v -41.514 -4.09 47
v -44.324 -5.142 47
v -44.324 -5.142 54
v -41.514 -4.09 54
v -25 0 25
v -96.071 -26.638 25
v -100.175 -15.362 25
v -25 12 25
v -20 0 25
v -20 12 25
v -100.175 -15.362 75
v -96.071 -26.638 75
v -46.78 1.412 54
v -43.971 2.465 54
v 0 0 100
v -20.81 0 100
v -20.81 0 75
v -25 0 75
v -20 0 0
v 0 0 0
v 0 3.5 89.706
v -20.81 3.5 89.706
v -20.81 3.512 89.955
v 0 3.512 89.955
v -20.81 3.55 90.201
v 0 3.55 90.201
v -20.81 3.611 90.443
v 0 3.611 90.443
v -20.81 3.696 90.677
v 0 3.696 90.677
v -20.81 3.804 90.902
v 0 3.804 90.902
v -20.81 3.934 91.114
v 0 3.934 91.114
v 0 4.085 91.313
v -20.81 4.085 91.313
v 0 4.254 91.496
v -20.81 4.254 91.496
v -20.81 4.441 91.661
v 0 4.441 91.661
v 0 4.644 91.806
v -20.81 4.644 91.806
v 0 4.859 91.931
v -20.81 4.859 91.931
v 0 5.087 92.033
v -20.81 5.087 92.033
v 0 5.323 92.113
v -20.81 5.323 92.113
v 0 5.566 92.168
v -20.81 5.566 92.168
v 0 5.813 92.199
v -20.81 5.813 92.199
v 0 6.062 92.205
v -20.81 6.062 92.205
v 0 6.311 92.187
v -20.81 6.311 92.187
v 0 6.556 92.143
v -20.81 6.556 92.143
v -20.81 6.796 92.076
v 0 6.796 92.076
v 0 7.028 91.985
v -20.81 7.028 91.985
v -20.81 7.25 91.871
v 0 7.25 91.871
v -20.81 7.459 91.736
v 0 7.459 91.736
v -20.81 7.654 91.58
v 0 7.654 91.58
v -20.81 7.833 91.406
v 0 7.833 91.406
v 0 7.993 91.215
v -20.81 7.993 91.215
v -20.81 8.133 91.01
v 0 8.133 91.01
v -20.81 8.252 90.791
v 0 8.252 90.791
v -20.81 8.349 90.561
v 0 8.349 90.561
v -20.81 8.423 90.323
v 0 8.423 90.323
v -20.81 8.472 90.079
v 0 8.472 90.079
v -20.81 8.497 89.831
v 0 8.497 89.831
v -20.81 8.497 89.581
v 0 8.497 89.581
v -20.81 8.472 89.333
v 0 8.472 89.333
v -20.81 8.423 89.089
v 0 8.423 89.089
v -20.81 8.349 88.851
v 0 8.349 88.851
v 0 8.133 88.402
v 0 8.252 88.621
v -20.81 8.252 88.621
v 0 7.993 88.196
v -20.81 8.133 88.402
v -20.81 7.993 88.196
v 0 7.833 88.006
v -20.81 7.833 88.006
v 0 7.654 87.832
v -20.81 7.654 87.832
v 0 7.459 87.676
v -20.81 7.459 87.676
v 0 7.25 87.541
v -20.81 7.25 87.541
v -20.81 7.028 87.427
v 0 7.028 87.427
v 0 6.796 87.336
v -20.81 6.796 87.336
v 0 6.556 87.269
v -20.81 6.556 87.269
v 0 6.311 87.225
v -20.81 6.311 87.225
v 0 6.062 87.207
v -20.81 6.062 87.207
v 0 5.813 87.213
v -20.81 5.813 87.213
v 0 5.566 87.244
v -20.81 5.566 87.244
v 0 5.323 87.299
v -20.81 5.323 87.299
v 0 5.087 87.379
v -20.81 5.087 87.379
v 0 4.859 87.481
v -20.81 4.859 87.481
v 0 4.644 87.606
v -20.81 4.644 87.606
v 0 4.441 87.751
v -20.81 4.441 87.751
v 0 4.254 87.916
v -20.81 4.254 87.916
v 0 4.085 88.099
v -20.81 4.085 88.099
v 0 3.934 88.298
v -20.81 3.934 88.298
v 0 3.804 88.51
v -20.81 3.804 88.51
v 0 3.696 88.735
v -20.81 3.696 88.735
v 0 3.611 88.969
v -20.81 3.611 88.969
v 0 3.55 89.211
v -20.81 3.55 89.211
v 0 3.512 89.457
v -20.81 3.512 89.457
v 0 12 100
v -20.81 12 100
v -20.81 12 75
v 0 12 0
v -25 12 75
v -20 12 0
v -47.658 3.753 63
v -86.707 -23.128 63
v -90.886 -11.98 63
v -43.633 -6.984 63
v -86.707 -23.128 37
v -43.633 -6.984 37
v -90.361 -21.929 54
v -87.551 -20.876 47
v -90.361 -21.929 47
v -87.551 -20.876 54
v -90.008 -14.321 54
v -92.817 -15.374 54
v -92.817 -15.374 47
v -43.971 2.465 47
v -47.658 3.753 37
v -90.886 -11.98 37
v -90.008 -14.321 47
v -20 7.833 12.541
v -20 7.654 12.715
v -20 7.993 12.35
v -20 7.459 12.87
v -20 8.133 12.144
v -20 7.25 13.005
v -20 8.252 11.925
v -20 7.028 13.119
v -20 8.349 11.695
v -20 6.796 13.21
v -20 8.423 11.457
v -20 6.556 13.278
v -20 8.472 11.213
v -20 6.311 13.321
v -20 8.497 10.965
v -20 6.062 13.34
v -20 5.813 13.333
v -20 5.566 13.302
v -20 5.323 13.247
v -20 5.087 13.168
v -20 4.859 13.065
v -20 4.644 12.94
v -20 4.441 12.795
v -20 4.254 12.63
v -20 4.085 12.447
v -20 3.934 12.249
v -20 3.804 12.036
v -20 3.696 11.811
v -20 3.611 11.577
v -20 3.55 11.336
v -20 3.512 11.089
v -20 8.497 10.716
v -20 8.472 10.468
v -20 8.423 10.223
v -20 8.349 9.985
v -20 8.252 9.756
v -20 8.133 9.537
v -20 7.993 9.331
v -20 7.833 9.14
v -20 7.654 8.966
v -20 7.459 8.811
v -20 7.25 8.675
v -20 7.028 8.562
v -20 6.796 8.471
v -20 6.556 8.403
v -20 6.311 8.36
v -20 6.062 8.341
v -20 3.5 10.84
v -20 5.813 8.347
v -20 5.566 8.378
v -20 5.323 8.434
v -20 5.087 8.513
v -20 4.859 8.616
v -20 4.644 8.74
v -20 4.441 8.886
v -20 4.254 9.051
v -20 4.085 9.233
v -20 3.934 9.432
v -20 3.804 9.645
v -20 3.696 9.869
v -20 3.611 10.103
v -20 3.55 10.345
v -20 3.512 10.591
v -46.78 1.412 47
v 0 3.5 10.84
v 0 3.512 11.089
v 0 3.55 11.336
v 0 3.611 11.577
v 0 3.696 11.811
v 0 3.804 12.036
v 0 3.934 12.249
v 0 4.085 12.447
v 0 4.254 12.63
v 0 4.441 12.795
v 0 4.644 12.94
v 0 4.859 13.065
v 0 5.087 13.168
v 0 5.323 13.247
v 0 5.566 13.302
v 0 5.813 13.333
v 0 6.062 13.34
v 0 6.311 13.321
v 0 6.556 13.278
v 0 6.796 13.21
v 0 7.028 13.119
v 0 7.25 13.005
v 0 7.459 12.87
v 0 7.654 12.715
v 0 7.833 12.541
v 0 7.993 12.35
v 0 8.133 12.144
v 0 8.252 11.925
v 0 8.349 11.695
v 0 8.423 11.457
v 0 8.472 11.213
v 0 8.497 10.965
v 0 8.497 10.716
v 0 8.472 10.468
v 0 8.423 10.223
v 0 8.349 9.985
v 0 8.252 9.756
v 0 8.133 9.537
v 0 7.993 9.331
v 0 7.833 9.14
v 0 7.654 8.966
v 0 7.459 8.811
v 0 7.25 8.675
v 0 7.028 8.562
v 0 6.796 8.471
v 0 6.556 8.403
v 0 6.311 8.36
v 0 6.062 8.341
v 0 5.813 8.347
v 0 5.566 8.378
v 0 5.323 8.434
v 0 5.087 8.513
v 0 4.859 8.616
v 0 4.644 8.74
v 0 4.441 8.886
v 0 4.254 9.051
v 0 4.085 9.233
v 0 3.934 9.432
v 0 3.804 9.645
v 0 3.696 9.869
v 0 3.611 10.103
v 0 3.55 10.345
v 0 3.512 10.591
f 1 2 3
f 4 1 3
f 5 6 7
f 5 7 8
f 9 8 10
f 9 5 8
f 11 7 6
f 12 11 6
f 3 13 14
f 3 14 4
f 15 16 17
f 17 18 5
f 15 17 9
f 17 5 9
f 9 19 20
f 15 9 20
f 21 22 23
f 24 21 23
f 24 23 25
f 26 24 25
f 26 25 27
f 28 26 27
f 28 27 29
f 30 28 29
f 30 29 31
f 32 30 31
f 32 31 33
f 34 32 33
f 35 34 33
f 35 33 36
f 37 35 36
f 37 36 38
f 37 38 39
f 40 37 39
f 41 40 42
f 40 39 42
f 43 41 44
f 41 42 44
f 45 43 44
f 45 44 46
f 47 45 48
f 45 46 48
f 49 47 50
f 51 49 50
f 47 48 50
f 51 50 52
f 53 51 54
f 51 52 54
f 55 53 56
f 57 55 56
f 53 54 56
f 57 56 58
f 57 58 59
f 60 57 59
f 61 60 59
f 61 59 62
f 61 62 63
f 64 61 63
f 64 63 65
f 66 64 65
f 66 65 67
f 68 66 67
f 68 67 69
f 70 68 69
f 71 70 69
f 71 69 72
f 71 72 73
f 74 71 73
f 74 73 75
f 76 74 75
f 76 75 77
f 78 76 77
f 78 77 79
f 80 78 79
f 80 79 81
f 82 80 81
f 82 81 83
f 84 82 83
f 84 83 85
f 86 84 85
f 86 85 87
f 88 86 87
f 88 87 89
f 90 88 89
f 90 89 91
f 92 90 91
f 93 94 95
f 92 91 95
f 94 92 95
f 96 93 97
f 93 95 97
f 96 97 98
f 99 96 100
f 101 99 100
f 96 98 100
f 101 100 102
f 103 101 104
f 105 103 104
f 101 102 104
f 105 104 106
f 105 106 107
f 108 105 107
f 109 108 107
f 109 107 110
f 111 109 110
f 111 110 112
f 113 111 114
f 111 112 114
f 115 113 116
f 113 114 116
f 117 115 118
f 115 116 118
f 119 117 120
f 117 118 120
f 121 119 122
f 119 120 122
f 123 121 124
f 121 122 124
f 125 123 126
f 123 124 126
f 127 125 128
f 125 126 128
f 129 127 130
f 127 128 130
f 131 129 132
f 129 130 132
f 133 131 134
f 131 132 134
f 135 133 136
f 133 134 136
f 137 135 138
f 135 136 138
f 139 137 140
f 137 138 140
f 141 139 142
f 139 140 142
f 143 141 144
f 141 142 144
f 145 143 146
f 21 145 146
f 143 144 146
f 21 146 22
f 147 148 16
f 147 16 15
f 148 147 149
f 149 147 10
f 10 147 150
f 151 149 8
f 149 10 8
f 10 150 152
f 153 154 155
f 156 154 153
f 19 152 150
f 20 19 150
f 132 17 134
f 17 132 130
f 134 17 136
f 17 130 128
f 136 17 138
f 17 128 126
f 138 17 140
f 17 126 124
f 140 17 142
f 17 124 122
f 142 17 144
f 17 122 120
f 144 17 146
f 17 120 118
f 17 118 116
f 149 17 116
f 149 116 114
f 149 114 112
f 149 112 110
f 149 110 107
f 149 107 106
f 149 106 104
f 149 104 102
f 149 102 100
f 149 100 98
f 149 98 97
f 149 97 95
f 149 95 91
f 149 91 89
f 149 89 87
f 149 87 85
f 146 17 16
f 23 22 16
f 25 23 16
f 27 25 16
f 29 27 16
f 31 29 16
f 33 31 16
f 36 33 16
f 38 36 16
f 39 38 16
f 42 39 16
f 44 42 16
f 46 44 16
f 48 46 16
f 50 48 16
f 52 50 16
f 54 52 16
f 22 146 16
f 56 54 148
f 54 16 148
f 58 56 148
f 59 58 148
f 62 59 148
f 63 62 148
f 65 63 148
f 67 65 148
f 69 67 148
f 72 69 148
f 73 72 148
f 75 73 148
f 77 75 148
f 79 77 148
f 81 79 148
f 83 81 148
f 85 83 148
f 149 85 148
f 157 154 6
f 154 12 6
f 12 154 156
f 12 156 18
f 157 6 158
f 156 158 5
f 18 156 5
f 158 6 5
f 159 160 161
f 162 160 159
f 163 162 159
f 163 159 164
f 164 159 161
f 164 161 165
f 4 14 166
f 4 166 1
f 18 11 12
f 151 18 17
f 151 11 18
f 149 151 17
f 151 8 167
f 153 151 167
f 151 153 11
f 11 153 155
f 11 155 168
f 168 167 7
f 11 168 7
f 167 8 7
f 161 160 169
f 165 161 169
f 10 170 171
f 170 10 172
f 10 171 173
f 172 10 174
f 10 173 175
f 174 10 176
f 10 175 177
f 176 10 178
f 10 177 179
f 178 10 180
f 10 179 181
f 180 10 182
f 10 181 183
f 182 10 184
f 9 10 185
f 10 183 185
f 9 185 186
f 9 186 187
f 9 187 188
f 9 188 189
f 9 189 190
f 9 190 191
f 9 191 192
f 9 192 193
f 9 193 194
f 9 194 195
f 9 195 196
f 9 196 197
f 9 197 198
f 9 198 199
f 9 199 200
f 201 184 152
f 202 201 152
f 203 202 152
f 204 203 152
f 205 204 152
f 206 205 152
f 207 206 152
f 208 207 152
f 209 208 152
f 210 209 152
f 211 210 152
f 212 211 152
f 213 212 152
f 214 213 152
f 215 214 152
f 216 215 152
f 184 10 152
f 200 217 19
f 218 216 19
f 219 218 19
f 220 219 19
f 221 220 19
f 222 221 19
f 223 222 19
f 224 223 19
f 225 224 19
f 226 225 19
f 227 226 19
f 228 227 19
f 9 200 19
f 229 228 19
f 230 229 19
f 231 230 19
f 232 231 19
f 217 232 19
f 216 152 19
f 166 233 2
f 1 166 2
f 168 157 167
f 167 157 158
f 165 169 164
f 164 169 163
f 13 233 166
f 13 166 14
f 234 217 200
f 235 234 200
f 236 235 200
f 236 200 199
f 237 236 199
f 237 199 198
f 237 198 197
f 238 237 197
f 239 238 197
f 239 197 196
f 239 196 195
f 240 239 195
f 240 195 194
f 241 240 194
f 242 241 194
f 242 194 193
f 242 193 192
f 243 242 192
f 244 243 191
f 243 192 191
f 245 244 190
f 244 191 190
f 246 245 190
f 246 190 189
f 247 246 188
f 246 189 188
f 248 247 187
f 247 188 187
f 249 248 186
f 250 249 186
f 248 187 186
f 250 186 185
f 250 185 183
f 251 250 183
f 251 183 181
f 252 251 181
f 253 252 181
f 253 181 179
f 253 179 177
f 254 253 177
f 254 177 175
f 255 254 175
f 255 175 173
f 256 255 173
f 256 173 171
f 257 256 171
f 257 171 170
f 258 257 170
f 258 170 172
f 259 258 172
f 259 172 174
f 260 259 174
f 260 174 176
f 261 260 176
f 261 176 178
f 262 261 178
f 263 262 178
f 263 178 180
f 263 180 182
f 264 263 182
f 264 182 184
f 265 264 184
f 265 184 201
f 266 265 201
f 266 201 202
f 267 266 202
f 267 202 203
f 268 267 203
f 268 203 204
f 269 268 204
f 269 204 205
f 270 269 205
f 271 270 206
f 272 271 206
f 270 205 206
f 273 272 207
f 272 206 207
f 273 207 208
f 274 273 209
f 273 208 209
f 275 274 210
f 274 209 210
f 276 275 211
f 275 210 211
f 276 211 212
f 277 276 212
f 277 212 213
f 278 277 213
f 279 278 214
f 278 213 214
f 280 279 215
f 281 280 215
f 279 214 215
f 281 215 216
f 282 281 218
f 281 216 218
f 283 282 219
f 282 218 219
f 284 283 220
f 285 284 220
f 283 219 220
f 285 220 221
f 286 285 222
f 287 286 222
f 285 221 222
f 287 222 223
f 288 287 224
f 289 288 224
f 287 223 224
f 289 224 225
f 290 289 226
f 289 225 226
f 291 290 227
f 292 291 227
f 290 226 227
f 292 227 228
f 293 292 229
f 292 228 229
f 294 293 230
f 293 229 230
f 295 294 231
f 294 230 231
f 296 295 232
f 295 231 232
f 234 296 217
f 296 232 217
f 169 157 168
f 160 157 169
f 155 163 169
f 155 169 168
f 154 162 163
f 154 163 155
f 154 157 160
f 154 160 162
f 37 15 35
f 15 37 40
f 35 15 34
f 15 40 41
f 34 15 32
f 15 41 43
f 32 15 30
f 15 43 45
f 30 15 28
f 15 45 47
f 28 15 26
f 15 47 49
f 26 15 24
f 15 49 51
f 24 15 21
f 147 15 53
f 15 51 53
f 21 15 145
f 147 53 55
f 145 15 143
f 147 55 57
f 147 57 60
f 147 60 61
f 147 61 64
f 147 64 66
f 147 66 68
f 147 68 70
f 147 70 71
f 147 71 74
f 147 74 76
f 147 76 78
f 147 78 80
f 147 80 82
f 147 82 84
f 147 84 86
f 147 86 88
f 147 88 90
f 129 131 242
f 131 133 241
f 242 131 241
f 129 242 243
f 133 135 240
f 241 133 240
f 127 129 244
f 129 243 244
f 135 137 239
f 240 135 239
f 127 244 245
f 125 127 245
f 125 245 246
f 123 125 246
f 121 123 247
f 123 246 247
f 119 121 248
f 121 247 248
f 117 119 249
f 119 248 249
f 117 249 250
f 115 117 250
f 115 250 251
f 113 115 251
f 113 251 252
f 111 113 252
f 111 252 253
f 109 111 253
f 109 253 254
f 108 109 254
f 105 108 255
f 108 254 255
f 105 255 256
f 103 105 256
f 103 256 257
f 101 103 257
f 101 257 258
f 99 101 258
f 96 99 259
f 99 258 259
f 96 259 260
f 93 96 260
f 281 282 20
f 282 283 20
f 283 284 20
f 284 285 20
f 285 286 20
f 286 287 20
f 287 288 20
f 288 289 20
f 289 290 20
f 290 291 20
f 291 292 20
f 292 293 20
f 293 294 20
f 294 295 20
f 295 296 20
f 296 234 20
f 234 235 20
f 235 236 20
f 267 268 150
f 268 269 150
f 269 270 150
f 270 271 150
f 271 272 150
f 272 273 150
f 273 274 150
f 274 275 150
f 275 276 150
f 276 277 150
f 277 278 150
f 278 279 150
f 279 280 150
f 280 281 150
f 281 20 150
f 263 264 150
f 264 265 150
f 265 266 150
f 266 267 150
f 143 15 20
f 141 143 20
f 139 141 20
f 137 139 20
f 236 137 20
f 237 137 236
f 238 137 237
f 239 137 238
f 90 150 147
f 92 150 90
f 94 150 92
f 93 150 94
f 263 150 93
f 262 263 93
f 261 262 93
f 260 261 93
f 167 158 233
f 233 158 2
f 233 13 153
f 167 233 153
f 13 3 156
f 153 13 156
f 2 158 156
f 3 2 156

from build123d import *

# Parameters (mm, degrees)
F1_DEPTH  = 100
F3_W      = 46
F3_H      = 26
F4_DEPTH  = 25
F7_W      = 98.6057445407
F7_H      = 75.1156285405
F8_DEPTH  = 30
F10_W     = 97.911
F10_H     = 83.95
F11_DEPTH = 30
F15_R     = 2.5
F16_DEPTH = 30
F13_R     = 2.5
F17_DEPTH = 30
F19_W     = 7
F19_H     = 7
F20_DEPTH = 8
F22_W     = 7
F22_H     = 7
F23_DEPTH = 8


with BuildPart() as f1:
    # F0 (on Top) → F1 (new body)
    with BuildSketch(Plane.XY):
        Polygon((-25, 0), (0, 0), (0, 12), (-25, 12), (-100.1754096629, -15.3616114661), (-96.071167943, -26.6379229155), align=None)
    extrude(amount=F1_DEPTH)

    # F3 (on offset) → F4 (cut)
    with BuildSketch(Plane(origin=(-3.0794008865, 8.2159790861, 0), x_dir=(0.9363887892, 0.3509644362, 0), z_dir=(0.3509644362, -0.9363887892, 0))):
        with Locations((-66.3089282241, 50)):
            Rectangle(F3_W, F3_H)
    extrude(amount=-F4_DEPTH, mode=Mode.SUBTRACT)

    # F7 (on offset) → F8 (cut)
    with BuildSketch(Plane.XY.offset(105)):
        with Locations((-70.1127834618, -4.4539272785)):
            Rectangle(F7_W, F7_H)
    extrude(amount=-F8_DEPTH, mode=Mode.SUBTRACT)

    # F10 (on offset) → F11 (cut)
    with BuildSketch(Plane(origin=(0, 0, -5), x_dir=(1, 0, 0), z_dir=(0, 0, -1))):
        with Locations((-68.9555, -1.8251938164)):
            Rectangle(F10_W, F10_H)
    extrude(amount=-F11_DEPTH, mode=Mode.SUBTRACT)

    # F15 (on offset) → F16 (cut)
    with BuildSketch(Plane(origin=(-25, 0, 0), x_dir=(0, -1, 0), z_dir=(-1, 0, 0))):
        with Locations((-6, 10.8403703198)):
            Circle(F15_R)
    extrude(amount=-F16_DEPTH, mode=Mode.SUBTRACT)

    # F13 (on offset) → F17 (cut)
    with BuildSketch(Plane(origin=(-25.8099111915, 0, 0), x_dir=(0, -1, 0), z_dir=(-1, 0, 0))):
        with Locations((-6, 89.705966413)):
            Circle(F13_R)
    extrude(amount=-F17_DEPTH, mode=Mode.SUBTRACT)

    # F19 (on offset) → F20 (cut)
    with BuildSketch(Plane(origin=(-45.2359388073, -16.9547157565, 0), x_dir=(0.3509644362, -0.9363887892, 0), z_dir=(-0.9363887892, -0.3509644362, 0))):
        with Locations((-14.240679825, 50.5)):
            Rectangle(F19_W, F19_H)
    extrude(amount=-F20_DEPTH, mode=Mode.SUBTRACT)

    # F22 (on offset) → F23 (cut)
    with BuildSketch(Plane(origin=(-78.9459352184, -29.5894354589, 0), x_dir=(-0.3509644362, 0.9363887892, 0), z_dir=(0.9363887892, 0.3509644362, 0))):
        with Locations((14.6793034593, 50.5)):
            Rectangle(F22_W, F22_H)
    extrude(amount=-F23_DEPTH, mode=Mode.SUBTRACT)


solid = f1.part
